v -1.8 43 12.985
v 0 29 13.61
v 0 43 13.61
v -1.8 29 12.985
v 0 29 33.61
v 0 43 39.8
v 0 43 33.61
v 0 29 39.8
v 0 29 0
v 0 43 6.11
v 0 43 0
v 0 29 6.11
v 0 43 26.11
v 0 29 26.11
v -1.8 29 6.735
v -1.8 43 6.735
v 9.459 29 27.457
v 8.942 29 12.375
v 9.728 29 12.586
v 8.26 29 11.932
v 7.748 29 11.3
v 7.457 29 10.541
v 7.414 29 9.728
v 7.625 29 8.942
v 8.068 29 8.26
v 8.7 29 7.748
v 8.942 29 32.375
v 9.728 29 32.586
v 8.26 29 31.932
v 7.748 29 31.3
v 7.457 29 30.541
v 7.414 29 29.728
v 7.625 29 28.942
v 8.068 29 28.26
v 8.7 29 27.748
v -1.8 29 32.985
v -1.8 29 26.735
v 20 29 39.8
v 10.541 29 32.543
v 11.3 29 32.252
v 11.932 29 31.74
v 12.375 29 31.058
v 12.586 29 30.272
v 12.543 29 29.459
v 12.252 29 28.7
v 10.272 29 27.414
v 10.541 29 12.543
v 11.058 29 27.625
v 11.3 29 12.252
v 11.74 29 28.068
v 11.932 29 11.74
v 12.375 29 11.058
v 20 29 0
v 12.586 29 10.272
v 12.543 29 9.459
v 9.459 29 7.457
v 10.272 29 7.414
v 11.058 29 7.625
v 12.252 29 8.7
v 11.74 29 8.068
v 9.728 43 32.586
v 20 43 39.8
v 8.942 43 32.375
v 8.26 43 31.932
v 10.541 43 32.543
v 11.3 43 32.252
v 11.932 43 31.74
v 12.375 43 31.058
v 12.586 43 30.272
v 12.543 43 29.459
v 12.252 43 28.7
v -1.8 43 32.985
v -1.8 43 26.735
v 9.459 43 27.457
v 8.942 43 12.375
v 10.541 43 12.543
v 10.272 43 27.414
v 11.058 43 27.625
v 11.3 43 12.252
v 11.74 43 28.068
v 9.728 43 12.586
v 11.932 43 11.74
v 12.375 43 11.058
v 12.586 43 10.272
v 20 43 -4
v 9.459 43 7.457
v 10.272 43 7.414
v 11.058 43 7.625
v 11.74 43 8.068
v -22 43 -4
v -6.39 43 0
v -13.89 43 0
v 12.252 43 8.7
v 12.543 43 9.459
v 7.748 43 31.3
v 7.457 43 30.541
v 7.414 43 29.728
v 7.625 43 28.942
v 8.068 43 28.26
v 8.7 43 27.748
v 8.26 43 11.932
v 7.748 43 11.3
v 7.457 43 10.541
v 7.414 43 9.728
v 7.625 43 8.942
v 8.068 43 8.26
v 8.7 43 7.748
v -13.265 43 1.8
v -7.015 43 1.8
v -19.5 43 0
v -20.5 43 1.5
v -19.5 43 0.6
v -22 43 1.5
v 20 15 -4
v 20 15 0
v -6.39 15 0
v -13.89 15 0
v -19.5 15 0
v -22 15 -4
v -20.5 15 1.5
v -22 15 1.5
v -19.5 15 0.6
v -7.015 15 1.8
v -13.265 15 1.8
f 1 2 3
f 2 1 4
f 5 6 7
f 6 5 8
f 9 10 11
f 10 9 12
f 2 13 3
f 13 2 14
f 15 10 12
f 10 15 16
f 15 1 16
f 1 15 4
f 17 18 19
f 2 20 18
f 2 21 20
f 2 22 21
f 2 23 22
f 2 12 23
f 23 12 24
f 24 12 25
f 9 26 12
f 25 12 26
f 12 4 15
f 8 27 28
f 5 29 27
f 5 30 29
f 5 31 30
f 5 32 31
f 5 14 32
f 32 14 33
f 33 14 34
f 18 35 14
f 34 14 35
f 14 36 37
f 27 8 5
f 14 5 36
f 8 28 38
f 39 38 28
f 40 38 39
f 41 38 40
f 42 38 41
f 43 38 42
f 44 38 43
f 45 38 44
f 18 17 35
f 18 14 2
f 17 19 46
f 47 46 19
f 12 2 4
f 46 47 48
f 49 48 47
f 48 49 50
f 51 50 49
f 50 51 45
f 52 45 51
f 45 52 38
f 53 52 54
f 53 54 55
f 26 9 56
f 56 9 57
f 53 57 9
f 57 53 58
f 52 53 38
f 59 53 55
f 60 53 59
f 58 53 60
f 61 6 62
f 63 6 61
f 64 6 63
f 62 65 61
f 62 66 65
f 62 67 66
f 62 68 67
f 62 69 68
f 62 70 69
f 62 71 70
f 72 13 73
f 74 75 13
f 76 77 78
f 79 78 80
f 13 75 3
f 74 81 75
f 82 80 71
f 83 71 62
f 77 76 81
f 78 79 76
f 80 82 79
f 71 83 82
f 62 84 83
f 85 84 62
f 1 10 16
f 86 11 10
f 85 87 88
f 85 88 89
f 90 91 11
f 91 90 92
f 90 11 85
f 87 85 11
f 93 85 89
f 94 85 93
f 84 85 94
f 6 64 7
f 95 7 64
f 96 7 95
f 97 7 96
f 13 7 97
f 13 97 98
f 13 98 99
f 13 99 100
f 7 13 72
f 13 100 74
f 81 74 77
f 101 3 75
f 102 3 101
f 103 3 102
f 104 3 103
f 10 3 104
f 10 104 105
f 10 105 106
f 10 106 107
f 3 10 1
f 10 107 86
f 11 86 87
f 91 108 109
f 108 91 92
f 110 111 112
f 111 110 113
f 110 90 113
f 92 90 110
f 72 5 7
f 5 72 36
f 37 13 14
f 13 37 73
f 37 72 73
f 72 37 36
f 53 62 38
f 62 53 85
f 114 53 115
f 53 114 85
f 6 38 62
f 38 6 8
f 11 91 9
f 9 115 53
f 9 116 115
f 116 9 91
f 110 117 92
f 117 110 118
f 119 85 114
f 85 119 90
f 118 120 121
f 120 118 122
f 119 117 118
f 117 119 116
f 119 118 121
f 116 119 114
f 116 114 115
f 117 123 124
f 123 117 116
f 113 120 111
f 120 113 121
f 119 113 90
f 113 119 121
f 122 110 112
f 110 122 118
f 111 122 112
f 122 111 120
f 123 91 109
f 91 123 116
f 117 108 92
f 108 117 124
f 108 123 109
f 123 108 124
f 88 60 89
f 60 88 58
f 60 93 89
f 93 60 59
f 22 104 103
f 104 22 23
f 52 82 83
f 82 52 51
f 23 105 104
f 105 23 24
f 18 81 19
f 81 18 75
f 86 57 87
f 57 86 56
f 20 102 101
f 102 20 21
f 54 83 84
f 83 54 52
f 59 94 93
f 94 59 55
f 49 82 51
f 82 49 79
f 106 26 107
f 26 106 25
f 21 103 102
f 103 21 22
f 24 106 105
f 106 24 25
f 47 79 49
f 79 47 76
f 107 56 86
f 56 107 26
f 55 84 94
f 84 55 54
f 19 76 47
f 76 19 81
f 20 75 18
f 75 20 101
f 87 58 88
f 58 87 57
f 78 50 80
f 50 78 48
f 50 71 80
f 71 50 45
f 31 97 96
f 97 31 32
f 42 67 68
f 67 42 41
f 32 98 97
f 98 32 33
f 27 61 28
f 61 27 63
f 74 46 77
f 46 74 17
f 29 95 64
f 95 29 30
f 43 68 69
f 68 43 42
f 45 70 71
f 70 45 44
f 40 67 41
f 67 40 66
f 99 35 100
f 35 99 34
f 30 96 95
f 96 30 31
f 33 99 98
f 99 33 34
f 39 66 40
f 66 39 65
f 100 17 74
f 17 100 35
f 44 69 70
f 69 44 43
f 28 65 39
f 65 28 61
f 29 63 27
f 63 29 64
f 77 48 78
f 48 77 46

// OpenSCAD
include <spool_holder.scad>;
use <spool_holder.scad>;

SPOOL_MOUNT_HW = M5;
SPOOL_MOUNT_HW_LEN = 74;
CONN_BOLT_LEN = 50;
BOLT_SIZE=M5;

difference(){
    union(){
            // jaw model (lower part)
            translate([0,ARM_BASE_W,0]) base(display_jaw=true);
            // base model(upper part)
            *translate([0,ARM_BASE_W,0]) base(display_base=true);
            // arm model
            *arm(
                dual_spool=true,
                display="arm",
                spool_bolt_size=SPOOL_MOUNT_HW,
                spool_bolt_len=SPOOL_MOUNT_HW_LEN);
            // left spool holder
            *arm(
                dual_spool=true,
                display="left",
                spool_bolt_size=SPOOL_MOUNT_HW,
                spool_bolt_len=SPOOL_MOUNT_HW_LEN);
            // right spool holder
            *arm(
                dual_spool=true,
                display="right",
                spool_bolt_size=SPOOL_MOUNT_HW,
                spool_bolt_len=SPOOL_MOUNT_HW_LEN);
            
            
        }
    //using joining hardware
    for (i=[10, 30]){
        translate([10, 0, i])
            rotate([270, 30, 0])
                bolt_nut(CONN_BOLT_LEN , BOLT_SIZE, flip=false);
    }
}
